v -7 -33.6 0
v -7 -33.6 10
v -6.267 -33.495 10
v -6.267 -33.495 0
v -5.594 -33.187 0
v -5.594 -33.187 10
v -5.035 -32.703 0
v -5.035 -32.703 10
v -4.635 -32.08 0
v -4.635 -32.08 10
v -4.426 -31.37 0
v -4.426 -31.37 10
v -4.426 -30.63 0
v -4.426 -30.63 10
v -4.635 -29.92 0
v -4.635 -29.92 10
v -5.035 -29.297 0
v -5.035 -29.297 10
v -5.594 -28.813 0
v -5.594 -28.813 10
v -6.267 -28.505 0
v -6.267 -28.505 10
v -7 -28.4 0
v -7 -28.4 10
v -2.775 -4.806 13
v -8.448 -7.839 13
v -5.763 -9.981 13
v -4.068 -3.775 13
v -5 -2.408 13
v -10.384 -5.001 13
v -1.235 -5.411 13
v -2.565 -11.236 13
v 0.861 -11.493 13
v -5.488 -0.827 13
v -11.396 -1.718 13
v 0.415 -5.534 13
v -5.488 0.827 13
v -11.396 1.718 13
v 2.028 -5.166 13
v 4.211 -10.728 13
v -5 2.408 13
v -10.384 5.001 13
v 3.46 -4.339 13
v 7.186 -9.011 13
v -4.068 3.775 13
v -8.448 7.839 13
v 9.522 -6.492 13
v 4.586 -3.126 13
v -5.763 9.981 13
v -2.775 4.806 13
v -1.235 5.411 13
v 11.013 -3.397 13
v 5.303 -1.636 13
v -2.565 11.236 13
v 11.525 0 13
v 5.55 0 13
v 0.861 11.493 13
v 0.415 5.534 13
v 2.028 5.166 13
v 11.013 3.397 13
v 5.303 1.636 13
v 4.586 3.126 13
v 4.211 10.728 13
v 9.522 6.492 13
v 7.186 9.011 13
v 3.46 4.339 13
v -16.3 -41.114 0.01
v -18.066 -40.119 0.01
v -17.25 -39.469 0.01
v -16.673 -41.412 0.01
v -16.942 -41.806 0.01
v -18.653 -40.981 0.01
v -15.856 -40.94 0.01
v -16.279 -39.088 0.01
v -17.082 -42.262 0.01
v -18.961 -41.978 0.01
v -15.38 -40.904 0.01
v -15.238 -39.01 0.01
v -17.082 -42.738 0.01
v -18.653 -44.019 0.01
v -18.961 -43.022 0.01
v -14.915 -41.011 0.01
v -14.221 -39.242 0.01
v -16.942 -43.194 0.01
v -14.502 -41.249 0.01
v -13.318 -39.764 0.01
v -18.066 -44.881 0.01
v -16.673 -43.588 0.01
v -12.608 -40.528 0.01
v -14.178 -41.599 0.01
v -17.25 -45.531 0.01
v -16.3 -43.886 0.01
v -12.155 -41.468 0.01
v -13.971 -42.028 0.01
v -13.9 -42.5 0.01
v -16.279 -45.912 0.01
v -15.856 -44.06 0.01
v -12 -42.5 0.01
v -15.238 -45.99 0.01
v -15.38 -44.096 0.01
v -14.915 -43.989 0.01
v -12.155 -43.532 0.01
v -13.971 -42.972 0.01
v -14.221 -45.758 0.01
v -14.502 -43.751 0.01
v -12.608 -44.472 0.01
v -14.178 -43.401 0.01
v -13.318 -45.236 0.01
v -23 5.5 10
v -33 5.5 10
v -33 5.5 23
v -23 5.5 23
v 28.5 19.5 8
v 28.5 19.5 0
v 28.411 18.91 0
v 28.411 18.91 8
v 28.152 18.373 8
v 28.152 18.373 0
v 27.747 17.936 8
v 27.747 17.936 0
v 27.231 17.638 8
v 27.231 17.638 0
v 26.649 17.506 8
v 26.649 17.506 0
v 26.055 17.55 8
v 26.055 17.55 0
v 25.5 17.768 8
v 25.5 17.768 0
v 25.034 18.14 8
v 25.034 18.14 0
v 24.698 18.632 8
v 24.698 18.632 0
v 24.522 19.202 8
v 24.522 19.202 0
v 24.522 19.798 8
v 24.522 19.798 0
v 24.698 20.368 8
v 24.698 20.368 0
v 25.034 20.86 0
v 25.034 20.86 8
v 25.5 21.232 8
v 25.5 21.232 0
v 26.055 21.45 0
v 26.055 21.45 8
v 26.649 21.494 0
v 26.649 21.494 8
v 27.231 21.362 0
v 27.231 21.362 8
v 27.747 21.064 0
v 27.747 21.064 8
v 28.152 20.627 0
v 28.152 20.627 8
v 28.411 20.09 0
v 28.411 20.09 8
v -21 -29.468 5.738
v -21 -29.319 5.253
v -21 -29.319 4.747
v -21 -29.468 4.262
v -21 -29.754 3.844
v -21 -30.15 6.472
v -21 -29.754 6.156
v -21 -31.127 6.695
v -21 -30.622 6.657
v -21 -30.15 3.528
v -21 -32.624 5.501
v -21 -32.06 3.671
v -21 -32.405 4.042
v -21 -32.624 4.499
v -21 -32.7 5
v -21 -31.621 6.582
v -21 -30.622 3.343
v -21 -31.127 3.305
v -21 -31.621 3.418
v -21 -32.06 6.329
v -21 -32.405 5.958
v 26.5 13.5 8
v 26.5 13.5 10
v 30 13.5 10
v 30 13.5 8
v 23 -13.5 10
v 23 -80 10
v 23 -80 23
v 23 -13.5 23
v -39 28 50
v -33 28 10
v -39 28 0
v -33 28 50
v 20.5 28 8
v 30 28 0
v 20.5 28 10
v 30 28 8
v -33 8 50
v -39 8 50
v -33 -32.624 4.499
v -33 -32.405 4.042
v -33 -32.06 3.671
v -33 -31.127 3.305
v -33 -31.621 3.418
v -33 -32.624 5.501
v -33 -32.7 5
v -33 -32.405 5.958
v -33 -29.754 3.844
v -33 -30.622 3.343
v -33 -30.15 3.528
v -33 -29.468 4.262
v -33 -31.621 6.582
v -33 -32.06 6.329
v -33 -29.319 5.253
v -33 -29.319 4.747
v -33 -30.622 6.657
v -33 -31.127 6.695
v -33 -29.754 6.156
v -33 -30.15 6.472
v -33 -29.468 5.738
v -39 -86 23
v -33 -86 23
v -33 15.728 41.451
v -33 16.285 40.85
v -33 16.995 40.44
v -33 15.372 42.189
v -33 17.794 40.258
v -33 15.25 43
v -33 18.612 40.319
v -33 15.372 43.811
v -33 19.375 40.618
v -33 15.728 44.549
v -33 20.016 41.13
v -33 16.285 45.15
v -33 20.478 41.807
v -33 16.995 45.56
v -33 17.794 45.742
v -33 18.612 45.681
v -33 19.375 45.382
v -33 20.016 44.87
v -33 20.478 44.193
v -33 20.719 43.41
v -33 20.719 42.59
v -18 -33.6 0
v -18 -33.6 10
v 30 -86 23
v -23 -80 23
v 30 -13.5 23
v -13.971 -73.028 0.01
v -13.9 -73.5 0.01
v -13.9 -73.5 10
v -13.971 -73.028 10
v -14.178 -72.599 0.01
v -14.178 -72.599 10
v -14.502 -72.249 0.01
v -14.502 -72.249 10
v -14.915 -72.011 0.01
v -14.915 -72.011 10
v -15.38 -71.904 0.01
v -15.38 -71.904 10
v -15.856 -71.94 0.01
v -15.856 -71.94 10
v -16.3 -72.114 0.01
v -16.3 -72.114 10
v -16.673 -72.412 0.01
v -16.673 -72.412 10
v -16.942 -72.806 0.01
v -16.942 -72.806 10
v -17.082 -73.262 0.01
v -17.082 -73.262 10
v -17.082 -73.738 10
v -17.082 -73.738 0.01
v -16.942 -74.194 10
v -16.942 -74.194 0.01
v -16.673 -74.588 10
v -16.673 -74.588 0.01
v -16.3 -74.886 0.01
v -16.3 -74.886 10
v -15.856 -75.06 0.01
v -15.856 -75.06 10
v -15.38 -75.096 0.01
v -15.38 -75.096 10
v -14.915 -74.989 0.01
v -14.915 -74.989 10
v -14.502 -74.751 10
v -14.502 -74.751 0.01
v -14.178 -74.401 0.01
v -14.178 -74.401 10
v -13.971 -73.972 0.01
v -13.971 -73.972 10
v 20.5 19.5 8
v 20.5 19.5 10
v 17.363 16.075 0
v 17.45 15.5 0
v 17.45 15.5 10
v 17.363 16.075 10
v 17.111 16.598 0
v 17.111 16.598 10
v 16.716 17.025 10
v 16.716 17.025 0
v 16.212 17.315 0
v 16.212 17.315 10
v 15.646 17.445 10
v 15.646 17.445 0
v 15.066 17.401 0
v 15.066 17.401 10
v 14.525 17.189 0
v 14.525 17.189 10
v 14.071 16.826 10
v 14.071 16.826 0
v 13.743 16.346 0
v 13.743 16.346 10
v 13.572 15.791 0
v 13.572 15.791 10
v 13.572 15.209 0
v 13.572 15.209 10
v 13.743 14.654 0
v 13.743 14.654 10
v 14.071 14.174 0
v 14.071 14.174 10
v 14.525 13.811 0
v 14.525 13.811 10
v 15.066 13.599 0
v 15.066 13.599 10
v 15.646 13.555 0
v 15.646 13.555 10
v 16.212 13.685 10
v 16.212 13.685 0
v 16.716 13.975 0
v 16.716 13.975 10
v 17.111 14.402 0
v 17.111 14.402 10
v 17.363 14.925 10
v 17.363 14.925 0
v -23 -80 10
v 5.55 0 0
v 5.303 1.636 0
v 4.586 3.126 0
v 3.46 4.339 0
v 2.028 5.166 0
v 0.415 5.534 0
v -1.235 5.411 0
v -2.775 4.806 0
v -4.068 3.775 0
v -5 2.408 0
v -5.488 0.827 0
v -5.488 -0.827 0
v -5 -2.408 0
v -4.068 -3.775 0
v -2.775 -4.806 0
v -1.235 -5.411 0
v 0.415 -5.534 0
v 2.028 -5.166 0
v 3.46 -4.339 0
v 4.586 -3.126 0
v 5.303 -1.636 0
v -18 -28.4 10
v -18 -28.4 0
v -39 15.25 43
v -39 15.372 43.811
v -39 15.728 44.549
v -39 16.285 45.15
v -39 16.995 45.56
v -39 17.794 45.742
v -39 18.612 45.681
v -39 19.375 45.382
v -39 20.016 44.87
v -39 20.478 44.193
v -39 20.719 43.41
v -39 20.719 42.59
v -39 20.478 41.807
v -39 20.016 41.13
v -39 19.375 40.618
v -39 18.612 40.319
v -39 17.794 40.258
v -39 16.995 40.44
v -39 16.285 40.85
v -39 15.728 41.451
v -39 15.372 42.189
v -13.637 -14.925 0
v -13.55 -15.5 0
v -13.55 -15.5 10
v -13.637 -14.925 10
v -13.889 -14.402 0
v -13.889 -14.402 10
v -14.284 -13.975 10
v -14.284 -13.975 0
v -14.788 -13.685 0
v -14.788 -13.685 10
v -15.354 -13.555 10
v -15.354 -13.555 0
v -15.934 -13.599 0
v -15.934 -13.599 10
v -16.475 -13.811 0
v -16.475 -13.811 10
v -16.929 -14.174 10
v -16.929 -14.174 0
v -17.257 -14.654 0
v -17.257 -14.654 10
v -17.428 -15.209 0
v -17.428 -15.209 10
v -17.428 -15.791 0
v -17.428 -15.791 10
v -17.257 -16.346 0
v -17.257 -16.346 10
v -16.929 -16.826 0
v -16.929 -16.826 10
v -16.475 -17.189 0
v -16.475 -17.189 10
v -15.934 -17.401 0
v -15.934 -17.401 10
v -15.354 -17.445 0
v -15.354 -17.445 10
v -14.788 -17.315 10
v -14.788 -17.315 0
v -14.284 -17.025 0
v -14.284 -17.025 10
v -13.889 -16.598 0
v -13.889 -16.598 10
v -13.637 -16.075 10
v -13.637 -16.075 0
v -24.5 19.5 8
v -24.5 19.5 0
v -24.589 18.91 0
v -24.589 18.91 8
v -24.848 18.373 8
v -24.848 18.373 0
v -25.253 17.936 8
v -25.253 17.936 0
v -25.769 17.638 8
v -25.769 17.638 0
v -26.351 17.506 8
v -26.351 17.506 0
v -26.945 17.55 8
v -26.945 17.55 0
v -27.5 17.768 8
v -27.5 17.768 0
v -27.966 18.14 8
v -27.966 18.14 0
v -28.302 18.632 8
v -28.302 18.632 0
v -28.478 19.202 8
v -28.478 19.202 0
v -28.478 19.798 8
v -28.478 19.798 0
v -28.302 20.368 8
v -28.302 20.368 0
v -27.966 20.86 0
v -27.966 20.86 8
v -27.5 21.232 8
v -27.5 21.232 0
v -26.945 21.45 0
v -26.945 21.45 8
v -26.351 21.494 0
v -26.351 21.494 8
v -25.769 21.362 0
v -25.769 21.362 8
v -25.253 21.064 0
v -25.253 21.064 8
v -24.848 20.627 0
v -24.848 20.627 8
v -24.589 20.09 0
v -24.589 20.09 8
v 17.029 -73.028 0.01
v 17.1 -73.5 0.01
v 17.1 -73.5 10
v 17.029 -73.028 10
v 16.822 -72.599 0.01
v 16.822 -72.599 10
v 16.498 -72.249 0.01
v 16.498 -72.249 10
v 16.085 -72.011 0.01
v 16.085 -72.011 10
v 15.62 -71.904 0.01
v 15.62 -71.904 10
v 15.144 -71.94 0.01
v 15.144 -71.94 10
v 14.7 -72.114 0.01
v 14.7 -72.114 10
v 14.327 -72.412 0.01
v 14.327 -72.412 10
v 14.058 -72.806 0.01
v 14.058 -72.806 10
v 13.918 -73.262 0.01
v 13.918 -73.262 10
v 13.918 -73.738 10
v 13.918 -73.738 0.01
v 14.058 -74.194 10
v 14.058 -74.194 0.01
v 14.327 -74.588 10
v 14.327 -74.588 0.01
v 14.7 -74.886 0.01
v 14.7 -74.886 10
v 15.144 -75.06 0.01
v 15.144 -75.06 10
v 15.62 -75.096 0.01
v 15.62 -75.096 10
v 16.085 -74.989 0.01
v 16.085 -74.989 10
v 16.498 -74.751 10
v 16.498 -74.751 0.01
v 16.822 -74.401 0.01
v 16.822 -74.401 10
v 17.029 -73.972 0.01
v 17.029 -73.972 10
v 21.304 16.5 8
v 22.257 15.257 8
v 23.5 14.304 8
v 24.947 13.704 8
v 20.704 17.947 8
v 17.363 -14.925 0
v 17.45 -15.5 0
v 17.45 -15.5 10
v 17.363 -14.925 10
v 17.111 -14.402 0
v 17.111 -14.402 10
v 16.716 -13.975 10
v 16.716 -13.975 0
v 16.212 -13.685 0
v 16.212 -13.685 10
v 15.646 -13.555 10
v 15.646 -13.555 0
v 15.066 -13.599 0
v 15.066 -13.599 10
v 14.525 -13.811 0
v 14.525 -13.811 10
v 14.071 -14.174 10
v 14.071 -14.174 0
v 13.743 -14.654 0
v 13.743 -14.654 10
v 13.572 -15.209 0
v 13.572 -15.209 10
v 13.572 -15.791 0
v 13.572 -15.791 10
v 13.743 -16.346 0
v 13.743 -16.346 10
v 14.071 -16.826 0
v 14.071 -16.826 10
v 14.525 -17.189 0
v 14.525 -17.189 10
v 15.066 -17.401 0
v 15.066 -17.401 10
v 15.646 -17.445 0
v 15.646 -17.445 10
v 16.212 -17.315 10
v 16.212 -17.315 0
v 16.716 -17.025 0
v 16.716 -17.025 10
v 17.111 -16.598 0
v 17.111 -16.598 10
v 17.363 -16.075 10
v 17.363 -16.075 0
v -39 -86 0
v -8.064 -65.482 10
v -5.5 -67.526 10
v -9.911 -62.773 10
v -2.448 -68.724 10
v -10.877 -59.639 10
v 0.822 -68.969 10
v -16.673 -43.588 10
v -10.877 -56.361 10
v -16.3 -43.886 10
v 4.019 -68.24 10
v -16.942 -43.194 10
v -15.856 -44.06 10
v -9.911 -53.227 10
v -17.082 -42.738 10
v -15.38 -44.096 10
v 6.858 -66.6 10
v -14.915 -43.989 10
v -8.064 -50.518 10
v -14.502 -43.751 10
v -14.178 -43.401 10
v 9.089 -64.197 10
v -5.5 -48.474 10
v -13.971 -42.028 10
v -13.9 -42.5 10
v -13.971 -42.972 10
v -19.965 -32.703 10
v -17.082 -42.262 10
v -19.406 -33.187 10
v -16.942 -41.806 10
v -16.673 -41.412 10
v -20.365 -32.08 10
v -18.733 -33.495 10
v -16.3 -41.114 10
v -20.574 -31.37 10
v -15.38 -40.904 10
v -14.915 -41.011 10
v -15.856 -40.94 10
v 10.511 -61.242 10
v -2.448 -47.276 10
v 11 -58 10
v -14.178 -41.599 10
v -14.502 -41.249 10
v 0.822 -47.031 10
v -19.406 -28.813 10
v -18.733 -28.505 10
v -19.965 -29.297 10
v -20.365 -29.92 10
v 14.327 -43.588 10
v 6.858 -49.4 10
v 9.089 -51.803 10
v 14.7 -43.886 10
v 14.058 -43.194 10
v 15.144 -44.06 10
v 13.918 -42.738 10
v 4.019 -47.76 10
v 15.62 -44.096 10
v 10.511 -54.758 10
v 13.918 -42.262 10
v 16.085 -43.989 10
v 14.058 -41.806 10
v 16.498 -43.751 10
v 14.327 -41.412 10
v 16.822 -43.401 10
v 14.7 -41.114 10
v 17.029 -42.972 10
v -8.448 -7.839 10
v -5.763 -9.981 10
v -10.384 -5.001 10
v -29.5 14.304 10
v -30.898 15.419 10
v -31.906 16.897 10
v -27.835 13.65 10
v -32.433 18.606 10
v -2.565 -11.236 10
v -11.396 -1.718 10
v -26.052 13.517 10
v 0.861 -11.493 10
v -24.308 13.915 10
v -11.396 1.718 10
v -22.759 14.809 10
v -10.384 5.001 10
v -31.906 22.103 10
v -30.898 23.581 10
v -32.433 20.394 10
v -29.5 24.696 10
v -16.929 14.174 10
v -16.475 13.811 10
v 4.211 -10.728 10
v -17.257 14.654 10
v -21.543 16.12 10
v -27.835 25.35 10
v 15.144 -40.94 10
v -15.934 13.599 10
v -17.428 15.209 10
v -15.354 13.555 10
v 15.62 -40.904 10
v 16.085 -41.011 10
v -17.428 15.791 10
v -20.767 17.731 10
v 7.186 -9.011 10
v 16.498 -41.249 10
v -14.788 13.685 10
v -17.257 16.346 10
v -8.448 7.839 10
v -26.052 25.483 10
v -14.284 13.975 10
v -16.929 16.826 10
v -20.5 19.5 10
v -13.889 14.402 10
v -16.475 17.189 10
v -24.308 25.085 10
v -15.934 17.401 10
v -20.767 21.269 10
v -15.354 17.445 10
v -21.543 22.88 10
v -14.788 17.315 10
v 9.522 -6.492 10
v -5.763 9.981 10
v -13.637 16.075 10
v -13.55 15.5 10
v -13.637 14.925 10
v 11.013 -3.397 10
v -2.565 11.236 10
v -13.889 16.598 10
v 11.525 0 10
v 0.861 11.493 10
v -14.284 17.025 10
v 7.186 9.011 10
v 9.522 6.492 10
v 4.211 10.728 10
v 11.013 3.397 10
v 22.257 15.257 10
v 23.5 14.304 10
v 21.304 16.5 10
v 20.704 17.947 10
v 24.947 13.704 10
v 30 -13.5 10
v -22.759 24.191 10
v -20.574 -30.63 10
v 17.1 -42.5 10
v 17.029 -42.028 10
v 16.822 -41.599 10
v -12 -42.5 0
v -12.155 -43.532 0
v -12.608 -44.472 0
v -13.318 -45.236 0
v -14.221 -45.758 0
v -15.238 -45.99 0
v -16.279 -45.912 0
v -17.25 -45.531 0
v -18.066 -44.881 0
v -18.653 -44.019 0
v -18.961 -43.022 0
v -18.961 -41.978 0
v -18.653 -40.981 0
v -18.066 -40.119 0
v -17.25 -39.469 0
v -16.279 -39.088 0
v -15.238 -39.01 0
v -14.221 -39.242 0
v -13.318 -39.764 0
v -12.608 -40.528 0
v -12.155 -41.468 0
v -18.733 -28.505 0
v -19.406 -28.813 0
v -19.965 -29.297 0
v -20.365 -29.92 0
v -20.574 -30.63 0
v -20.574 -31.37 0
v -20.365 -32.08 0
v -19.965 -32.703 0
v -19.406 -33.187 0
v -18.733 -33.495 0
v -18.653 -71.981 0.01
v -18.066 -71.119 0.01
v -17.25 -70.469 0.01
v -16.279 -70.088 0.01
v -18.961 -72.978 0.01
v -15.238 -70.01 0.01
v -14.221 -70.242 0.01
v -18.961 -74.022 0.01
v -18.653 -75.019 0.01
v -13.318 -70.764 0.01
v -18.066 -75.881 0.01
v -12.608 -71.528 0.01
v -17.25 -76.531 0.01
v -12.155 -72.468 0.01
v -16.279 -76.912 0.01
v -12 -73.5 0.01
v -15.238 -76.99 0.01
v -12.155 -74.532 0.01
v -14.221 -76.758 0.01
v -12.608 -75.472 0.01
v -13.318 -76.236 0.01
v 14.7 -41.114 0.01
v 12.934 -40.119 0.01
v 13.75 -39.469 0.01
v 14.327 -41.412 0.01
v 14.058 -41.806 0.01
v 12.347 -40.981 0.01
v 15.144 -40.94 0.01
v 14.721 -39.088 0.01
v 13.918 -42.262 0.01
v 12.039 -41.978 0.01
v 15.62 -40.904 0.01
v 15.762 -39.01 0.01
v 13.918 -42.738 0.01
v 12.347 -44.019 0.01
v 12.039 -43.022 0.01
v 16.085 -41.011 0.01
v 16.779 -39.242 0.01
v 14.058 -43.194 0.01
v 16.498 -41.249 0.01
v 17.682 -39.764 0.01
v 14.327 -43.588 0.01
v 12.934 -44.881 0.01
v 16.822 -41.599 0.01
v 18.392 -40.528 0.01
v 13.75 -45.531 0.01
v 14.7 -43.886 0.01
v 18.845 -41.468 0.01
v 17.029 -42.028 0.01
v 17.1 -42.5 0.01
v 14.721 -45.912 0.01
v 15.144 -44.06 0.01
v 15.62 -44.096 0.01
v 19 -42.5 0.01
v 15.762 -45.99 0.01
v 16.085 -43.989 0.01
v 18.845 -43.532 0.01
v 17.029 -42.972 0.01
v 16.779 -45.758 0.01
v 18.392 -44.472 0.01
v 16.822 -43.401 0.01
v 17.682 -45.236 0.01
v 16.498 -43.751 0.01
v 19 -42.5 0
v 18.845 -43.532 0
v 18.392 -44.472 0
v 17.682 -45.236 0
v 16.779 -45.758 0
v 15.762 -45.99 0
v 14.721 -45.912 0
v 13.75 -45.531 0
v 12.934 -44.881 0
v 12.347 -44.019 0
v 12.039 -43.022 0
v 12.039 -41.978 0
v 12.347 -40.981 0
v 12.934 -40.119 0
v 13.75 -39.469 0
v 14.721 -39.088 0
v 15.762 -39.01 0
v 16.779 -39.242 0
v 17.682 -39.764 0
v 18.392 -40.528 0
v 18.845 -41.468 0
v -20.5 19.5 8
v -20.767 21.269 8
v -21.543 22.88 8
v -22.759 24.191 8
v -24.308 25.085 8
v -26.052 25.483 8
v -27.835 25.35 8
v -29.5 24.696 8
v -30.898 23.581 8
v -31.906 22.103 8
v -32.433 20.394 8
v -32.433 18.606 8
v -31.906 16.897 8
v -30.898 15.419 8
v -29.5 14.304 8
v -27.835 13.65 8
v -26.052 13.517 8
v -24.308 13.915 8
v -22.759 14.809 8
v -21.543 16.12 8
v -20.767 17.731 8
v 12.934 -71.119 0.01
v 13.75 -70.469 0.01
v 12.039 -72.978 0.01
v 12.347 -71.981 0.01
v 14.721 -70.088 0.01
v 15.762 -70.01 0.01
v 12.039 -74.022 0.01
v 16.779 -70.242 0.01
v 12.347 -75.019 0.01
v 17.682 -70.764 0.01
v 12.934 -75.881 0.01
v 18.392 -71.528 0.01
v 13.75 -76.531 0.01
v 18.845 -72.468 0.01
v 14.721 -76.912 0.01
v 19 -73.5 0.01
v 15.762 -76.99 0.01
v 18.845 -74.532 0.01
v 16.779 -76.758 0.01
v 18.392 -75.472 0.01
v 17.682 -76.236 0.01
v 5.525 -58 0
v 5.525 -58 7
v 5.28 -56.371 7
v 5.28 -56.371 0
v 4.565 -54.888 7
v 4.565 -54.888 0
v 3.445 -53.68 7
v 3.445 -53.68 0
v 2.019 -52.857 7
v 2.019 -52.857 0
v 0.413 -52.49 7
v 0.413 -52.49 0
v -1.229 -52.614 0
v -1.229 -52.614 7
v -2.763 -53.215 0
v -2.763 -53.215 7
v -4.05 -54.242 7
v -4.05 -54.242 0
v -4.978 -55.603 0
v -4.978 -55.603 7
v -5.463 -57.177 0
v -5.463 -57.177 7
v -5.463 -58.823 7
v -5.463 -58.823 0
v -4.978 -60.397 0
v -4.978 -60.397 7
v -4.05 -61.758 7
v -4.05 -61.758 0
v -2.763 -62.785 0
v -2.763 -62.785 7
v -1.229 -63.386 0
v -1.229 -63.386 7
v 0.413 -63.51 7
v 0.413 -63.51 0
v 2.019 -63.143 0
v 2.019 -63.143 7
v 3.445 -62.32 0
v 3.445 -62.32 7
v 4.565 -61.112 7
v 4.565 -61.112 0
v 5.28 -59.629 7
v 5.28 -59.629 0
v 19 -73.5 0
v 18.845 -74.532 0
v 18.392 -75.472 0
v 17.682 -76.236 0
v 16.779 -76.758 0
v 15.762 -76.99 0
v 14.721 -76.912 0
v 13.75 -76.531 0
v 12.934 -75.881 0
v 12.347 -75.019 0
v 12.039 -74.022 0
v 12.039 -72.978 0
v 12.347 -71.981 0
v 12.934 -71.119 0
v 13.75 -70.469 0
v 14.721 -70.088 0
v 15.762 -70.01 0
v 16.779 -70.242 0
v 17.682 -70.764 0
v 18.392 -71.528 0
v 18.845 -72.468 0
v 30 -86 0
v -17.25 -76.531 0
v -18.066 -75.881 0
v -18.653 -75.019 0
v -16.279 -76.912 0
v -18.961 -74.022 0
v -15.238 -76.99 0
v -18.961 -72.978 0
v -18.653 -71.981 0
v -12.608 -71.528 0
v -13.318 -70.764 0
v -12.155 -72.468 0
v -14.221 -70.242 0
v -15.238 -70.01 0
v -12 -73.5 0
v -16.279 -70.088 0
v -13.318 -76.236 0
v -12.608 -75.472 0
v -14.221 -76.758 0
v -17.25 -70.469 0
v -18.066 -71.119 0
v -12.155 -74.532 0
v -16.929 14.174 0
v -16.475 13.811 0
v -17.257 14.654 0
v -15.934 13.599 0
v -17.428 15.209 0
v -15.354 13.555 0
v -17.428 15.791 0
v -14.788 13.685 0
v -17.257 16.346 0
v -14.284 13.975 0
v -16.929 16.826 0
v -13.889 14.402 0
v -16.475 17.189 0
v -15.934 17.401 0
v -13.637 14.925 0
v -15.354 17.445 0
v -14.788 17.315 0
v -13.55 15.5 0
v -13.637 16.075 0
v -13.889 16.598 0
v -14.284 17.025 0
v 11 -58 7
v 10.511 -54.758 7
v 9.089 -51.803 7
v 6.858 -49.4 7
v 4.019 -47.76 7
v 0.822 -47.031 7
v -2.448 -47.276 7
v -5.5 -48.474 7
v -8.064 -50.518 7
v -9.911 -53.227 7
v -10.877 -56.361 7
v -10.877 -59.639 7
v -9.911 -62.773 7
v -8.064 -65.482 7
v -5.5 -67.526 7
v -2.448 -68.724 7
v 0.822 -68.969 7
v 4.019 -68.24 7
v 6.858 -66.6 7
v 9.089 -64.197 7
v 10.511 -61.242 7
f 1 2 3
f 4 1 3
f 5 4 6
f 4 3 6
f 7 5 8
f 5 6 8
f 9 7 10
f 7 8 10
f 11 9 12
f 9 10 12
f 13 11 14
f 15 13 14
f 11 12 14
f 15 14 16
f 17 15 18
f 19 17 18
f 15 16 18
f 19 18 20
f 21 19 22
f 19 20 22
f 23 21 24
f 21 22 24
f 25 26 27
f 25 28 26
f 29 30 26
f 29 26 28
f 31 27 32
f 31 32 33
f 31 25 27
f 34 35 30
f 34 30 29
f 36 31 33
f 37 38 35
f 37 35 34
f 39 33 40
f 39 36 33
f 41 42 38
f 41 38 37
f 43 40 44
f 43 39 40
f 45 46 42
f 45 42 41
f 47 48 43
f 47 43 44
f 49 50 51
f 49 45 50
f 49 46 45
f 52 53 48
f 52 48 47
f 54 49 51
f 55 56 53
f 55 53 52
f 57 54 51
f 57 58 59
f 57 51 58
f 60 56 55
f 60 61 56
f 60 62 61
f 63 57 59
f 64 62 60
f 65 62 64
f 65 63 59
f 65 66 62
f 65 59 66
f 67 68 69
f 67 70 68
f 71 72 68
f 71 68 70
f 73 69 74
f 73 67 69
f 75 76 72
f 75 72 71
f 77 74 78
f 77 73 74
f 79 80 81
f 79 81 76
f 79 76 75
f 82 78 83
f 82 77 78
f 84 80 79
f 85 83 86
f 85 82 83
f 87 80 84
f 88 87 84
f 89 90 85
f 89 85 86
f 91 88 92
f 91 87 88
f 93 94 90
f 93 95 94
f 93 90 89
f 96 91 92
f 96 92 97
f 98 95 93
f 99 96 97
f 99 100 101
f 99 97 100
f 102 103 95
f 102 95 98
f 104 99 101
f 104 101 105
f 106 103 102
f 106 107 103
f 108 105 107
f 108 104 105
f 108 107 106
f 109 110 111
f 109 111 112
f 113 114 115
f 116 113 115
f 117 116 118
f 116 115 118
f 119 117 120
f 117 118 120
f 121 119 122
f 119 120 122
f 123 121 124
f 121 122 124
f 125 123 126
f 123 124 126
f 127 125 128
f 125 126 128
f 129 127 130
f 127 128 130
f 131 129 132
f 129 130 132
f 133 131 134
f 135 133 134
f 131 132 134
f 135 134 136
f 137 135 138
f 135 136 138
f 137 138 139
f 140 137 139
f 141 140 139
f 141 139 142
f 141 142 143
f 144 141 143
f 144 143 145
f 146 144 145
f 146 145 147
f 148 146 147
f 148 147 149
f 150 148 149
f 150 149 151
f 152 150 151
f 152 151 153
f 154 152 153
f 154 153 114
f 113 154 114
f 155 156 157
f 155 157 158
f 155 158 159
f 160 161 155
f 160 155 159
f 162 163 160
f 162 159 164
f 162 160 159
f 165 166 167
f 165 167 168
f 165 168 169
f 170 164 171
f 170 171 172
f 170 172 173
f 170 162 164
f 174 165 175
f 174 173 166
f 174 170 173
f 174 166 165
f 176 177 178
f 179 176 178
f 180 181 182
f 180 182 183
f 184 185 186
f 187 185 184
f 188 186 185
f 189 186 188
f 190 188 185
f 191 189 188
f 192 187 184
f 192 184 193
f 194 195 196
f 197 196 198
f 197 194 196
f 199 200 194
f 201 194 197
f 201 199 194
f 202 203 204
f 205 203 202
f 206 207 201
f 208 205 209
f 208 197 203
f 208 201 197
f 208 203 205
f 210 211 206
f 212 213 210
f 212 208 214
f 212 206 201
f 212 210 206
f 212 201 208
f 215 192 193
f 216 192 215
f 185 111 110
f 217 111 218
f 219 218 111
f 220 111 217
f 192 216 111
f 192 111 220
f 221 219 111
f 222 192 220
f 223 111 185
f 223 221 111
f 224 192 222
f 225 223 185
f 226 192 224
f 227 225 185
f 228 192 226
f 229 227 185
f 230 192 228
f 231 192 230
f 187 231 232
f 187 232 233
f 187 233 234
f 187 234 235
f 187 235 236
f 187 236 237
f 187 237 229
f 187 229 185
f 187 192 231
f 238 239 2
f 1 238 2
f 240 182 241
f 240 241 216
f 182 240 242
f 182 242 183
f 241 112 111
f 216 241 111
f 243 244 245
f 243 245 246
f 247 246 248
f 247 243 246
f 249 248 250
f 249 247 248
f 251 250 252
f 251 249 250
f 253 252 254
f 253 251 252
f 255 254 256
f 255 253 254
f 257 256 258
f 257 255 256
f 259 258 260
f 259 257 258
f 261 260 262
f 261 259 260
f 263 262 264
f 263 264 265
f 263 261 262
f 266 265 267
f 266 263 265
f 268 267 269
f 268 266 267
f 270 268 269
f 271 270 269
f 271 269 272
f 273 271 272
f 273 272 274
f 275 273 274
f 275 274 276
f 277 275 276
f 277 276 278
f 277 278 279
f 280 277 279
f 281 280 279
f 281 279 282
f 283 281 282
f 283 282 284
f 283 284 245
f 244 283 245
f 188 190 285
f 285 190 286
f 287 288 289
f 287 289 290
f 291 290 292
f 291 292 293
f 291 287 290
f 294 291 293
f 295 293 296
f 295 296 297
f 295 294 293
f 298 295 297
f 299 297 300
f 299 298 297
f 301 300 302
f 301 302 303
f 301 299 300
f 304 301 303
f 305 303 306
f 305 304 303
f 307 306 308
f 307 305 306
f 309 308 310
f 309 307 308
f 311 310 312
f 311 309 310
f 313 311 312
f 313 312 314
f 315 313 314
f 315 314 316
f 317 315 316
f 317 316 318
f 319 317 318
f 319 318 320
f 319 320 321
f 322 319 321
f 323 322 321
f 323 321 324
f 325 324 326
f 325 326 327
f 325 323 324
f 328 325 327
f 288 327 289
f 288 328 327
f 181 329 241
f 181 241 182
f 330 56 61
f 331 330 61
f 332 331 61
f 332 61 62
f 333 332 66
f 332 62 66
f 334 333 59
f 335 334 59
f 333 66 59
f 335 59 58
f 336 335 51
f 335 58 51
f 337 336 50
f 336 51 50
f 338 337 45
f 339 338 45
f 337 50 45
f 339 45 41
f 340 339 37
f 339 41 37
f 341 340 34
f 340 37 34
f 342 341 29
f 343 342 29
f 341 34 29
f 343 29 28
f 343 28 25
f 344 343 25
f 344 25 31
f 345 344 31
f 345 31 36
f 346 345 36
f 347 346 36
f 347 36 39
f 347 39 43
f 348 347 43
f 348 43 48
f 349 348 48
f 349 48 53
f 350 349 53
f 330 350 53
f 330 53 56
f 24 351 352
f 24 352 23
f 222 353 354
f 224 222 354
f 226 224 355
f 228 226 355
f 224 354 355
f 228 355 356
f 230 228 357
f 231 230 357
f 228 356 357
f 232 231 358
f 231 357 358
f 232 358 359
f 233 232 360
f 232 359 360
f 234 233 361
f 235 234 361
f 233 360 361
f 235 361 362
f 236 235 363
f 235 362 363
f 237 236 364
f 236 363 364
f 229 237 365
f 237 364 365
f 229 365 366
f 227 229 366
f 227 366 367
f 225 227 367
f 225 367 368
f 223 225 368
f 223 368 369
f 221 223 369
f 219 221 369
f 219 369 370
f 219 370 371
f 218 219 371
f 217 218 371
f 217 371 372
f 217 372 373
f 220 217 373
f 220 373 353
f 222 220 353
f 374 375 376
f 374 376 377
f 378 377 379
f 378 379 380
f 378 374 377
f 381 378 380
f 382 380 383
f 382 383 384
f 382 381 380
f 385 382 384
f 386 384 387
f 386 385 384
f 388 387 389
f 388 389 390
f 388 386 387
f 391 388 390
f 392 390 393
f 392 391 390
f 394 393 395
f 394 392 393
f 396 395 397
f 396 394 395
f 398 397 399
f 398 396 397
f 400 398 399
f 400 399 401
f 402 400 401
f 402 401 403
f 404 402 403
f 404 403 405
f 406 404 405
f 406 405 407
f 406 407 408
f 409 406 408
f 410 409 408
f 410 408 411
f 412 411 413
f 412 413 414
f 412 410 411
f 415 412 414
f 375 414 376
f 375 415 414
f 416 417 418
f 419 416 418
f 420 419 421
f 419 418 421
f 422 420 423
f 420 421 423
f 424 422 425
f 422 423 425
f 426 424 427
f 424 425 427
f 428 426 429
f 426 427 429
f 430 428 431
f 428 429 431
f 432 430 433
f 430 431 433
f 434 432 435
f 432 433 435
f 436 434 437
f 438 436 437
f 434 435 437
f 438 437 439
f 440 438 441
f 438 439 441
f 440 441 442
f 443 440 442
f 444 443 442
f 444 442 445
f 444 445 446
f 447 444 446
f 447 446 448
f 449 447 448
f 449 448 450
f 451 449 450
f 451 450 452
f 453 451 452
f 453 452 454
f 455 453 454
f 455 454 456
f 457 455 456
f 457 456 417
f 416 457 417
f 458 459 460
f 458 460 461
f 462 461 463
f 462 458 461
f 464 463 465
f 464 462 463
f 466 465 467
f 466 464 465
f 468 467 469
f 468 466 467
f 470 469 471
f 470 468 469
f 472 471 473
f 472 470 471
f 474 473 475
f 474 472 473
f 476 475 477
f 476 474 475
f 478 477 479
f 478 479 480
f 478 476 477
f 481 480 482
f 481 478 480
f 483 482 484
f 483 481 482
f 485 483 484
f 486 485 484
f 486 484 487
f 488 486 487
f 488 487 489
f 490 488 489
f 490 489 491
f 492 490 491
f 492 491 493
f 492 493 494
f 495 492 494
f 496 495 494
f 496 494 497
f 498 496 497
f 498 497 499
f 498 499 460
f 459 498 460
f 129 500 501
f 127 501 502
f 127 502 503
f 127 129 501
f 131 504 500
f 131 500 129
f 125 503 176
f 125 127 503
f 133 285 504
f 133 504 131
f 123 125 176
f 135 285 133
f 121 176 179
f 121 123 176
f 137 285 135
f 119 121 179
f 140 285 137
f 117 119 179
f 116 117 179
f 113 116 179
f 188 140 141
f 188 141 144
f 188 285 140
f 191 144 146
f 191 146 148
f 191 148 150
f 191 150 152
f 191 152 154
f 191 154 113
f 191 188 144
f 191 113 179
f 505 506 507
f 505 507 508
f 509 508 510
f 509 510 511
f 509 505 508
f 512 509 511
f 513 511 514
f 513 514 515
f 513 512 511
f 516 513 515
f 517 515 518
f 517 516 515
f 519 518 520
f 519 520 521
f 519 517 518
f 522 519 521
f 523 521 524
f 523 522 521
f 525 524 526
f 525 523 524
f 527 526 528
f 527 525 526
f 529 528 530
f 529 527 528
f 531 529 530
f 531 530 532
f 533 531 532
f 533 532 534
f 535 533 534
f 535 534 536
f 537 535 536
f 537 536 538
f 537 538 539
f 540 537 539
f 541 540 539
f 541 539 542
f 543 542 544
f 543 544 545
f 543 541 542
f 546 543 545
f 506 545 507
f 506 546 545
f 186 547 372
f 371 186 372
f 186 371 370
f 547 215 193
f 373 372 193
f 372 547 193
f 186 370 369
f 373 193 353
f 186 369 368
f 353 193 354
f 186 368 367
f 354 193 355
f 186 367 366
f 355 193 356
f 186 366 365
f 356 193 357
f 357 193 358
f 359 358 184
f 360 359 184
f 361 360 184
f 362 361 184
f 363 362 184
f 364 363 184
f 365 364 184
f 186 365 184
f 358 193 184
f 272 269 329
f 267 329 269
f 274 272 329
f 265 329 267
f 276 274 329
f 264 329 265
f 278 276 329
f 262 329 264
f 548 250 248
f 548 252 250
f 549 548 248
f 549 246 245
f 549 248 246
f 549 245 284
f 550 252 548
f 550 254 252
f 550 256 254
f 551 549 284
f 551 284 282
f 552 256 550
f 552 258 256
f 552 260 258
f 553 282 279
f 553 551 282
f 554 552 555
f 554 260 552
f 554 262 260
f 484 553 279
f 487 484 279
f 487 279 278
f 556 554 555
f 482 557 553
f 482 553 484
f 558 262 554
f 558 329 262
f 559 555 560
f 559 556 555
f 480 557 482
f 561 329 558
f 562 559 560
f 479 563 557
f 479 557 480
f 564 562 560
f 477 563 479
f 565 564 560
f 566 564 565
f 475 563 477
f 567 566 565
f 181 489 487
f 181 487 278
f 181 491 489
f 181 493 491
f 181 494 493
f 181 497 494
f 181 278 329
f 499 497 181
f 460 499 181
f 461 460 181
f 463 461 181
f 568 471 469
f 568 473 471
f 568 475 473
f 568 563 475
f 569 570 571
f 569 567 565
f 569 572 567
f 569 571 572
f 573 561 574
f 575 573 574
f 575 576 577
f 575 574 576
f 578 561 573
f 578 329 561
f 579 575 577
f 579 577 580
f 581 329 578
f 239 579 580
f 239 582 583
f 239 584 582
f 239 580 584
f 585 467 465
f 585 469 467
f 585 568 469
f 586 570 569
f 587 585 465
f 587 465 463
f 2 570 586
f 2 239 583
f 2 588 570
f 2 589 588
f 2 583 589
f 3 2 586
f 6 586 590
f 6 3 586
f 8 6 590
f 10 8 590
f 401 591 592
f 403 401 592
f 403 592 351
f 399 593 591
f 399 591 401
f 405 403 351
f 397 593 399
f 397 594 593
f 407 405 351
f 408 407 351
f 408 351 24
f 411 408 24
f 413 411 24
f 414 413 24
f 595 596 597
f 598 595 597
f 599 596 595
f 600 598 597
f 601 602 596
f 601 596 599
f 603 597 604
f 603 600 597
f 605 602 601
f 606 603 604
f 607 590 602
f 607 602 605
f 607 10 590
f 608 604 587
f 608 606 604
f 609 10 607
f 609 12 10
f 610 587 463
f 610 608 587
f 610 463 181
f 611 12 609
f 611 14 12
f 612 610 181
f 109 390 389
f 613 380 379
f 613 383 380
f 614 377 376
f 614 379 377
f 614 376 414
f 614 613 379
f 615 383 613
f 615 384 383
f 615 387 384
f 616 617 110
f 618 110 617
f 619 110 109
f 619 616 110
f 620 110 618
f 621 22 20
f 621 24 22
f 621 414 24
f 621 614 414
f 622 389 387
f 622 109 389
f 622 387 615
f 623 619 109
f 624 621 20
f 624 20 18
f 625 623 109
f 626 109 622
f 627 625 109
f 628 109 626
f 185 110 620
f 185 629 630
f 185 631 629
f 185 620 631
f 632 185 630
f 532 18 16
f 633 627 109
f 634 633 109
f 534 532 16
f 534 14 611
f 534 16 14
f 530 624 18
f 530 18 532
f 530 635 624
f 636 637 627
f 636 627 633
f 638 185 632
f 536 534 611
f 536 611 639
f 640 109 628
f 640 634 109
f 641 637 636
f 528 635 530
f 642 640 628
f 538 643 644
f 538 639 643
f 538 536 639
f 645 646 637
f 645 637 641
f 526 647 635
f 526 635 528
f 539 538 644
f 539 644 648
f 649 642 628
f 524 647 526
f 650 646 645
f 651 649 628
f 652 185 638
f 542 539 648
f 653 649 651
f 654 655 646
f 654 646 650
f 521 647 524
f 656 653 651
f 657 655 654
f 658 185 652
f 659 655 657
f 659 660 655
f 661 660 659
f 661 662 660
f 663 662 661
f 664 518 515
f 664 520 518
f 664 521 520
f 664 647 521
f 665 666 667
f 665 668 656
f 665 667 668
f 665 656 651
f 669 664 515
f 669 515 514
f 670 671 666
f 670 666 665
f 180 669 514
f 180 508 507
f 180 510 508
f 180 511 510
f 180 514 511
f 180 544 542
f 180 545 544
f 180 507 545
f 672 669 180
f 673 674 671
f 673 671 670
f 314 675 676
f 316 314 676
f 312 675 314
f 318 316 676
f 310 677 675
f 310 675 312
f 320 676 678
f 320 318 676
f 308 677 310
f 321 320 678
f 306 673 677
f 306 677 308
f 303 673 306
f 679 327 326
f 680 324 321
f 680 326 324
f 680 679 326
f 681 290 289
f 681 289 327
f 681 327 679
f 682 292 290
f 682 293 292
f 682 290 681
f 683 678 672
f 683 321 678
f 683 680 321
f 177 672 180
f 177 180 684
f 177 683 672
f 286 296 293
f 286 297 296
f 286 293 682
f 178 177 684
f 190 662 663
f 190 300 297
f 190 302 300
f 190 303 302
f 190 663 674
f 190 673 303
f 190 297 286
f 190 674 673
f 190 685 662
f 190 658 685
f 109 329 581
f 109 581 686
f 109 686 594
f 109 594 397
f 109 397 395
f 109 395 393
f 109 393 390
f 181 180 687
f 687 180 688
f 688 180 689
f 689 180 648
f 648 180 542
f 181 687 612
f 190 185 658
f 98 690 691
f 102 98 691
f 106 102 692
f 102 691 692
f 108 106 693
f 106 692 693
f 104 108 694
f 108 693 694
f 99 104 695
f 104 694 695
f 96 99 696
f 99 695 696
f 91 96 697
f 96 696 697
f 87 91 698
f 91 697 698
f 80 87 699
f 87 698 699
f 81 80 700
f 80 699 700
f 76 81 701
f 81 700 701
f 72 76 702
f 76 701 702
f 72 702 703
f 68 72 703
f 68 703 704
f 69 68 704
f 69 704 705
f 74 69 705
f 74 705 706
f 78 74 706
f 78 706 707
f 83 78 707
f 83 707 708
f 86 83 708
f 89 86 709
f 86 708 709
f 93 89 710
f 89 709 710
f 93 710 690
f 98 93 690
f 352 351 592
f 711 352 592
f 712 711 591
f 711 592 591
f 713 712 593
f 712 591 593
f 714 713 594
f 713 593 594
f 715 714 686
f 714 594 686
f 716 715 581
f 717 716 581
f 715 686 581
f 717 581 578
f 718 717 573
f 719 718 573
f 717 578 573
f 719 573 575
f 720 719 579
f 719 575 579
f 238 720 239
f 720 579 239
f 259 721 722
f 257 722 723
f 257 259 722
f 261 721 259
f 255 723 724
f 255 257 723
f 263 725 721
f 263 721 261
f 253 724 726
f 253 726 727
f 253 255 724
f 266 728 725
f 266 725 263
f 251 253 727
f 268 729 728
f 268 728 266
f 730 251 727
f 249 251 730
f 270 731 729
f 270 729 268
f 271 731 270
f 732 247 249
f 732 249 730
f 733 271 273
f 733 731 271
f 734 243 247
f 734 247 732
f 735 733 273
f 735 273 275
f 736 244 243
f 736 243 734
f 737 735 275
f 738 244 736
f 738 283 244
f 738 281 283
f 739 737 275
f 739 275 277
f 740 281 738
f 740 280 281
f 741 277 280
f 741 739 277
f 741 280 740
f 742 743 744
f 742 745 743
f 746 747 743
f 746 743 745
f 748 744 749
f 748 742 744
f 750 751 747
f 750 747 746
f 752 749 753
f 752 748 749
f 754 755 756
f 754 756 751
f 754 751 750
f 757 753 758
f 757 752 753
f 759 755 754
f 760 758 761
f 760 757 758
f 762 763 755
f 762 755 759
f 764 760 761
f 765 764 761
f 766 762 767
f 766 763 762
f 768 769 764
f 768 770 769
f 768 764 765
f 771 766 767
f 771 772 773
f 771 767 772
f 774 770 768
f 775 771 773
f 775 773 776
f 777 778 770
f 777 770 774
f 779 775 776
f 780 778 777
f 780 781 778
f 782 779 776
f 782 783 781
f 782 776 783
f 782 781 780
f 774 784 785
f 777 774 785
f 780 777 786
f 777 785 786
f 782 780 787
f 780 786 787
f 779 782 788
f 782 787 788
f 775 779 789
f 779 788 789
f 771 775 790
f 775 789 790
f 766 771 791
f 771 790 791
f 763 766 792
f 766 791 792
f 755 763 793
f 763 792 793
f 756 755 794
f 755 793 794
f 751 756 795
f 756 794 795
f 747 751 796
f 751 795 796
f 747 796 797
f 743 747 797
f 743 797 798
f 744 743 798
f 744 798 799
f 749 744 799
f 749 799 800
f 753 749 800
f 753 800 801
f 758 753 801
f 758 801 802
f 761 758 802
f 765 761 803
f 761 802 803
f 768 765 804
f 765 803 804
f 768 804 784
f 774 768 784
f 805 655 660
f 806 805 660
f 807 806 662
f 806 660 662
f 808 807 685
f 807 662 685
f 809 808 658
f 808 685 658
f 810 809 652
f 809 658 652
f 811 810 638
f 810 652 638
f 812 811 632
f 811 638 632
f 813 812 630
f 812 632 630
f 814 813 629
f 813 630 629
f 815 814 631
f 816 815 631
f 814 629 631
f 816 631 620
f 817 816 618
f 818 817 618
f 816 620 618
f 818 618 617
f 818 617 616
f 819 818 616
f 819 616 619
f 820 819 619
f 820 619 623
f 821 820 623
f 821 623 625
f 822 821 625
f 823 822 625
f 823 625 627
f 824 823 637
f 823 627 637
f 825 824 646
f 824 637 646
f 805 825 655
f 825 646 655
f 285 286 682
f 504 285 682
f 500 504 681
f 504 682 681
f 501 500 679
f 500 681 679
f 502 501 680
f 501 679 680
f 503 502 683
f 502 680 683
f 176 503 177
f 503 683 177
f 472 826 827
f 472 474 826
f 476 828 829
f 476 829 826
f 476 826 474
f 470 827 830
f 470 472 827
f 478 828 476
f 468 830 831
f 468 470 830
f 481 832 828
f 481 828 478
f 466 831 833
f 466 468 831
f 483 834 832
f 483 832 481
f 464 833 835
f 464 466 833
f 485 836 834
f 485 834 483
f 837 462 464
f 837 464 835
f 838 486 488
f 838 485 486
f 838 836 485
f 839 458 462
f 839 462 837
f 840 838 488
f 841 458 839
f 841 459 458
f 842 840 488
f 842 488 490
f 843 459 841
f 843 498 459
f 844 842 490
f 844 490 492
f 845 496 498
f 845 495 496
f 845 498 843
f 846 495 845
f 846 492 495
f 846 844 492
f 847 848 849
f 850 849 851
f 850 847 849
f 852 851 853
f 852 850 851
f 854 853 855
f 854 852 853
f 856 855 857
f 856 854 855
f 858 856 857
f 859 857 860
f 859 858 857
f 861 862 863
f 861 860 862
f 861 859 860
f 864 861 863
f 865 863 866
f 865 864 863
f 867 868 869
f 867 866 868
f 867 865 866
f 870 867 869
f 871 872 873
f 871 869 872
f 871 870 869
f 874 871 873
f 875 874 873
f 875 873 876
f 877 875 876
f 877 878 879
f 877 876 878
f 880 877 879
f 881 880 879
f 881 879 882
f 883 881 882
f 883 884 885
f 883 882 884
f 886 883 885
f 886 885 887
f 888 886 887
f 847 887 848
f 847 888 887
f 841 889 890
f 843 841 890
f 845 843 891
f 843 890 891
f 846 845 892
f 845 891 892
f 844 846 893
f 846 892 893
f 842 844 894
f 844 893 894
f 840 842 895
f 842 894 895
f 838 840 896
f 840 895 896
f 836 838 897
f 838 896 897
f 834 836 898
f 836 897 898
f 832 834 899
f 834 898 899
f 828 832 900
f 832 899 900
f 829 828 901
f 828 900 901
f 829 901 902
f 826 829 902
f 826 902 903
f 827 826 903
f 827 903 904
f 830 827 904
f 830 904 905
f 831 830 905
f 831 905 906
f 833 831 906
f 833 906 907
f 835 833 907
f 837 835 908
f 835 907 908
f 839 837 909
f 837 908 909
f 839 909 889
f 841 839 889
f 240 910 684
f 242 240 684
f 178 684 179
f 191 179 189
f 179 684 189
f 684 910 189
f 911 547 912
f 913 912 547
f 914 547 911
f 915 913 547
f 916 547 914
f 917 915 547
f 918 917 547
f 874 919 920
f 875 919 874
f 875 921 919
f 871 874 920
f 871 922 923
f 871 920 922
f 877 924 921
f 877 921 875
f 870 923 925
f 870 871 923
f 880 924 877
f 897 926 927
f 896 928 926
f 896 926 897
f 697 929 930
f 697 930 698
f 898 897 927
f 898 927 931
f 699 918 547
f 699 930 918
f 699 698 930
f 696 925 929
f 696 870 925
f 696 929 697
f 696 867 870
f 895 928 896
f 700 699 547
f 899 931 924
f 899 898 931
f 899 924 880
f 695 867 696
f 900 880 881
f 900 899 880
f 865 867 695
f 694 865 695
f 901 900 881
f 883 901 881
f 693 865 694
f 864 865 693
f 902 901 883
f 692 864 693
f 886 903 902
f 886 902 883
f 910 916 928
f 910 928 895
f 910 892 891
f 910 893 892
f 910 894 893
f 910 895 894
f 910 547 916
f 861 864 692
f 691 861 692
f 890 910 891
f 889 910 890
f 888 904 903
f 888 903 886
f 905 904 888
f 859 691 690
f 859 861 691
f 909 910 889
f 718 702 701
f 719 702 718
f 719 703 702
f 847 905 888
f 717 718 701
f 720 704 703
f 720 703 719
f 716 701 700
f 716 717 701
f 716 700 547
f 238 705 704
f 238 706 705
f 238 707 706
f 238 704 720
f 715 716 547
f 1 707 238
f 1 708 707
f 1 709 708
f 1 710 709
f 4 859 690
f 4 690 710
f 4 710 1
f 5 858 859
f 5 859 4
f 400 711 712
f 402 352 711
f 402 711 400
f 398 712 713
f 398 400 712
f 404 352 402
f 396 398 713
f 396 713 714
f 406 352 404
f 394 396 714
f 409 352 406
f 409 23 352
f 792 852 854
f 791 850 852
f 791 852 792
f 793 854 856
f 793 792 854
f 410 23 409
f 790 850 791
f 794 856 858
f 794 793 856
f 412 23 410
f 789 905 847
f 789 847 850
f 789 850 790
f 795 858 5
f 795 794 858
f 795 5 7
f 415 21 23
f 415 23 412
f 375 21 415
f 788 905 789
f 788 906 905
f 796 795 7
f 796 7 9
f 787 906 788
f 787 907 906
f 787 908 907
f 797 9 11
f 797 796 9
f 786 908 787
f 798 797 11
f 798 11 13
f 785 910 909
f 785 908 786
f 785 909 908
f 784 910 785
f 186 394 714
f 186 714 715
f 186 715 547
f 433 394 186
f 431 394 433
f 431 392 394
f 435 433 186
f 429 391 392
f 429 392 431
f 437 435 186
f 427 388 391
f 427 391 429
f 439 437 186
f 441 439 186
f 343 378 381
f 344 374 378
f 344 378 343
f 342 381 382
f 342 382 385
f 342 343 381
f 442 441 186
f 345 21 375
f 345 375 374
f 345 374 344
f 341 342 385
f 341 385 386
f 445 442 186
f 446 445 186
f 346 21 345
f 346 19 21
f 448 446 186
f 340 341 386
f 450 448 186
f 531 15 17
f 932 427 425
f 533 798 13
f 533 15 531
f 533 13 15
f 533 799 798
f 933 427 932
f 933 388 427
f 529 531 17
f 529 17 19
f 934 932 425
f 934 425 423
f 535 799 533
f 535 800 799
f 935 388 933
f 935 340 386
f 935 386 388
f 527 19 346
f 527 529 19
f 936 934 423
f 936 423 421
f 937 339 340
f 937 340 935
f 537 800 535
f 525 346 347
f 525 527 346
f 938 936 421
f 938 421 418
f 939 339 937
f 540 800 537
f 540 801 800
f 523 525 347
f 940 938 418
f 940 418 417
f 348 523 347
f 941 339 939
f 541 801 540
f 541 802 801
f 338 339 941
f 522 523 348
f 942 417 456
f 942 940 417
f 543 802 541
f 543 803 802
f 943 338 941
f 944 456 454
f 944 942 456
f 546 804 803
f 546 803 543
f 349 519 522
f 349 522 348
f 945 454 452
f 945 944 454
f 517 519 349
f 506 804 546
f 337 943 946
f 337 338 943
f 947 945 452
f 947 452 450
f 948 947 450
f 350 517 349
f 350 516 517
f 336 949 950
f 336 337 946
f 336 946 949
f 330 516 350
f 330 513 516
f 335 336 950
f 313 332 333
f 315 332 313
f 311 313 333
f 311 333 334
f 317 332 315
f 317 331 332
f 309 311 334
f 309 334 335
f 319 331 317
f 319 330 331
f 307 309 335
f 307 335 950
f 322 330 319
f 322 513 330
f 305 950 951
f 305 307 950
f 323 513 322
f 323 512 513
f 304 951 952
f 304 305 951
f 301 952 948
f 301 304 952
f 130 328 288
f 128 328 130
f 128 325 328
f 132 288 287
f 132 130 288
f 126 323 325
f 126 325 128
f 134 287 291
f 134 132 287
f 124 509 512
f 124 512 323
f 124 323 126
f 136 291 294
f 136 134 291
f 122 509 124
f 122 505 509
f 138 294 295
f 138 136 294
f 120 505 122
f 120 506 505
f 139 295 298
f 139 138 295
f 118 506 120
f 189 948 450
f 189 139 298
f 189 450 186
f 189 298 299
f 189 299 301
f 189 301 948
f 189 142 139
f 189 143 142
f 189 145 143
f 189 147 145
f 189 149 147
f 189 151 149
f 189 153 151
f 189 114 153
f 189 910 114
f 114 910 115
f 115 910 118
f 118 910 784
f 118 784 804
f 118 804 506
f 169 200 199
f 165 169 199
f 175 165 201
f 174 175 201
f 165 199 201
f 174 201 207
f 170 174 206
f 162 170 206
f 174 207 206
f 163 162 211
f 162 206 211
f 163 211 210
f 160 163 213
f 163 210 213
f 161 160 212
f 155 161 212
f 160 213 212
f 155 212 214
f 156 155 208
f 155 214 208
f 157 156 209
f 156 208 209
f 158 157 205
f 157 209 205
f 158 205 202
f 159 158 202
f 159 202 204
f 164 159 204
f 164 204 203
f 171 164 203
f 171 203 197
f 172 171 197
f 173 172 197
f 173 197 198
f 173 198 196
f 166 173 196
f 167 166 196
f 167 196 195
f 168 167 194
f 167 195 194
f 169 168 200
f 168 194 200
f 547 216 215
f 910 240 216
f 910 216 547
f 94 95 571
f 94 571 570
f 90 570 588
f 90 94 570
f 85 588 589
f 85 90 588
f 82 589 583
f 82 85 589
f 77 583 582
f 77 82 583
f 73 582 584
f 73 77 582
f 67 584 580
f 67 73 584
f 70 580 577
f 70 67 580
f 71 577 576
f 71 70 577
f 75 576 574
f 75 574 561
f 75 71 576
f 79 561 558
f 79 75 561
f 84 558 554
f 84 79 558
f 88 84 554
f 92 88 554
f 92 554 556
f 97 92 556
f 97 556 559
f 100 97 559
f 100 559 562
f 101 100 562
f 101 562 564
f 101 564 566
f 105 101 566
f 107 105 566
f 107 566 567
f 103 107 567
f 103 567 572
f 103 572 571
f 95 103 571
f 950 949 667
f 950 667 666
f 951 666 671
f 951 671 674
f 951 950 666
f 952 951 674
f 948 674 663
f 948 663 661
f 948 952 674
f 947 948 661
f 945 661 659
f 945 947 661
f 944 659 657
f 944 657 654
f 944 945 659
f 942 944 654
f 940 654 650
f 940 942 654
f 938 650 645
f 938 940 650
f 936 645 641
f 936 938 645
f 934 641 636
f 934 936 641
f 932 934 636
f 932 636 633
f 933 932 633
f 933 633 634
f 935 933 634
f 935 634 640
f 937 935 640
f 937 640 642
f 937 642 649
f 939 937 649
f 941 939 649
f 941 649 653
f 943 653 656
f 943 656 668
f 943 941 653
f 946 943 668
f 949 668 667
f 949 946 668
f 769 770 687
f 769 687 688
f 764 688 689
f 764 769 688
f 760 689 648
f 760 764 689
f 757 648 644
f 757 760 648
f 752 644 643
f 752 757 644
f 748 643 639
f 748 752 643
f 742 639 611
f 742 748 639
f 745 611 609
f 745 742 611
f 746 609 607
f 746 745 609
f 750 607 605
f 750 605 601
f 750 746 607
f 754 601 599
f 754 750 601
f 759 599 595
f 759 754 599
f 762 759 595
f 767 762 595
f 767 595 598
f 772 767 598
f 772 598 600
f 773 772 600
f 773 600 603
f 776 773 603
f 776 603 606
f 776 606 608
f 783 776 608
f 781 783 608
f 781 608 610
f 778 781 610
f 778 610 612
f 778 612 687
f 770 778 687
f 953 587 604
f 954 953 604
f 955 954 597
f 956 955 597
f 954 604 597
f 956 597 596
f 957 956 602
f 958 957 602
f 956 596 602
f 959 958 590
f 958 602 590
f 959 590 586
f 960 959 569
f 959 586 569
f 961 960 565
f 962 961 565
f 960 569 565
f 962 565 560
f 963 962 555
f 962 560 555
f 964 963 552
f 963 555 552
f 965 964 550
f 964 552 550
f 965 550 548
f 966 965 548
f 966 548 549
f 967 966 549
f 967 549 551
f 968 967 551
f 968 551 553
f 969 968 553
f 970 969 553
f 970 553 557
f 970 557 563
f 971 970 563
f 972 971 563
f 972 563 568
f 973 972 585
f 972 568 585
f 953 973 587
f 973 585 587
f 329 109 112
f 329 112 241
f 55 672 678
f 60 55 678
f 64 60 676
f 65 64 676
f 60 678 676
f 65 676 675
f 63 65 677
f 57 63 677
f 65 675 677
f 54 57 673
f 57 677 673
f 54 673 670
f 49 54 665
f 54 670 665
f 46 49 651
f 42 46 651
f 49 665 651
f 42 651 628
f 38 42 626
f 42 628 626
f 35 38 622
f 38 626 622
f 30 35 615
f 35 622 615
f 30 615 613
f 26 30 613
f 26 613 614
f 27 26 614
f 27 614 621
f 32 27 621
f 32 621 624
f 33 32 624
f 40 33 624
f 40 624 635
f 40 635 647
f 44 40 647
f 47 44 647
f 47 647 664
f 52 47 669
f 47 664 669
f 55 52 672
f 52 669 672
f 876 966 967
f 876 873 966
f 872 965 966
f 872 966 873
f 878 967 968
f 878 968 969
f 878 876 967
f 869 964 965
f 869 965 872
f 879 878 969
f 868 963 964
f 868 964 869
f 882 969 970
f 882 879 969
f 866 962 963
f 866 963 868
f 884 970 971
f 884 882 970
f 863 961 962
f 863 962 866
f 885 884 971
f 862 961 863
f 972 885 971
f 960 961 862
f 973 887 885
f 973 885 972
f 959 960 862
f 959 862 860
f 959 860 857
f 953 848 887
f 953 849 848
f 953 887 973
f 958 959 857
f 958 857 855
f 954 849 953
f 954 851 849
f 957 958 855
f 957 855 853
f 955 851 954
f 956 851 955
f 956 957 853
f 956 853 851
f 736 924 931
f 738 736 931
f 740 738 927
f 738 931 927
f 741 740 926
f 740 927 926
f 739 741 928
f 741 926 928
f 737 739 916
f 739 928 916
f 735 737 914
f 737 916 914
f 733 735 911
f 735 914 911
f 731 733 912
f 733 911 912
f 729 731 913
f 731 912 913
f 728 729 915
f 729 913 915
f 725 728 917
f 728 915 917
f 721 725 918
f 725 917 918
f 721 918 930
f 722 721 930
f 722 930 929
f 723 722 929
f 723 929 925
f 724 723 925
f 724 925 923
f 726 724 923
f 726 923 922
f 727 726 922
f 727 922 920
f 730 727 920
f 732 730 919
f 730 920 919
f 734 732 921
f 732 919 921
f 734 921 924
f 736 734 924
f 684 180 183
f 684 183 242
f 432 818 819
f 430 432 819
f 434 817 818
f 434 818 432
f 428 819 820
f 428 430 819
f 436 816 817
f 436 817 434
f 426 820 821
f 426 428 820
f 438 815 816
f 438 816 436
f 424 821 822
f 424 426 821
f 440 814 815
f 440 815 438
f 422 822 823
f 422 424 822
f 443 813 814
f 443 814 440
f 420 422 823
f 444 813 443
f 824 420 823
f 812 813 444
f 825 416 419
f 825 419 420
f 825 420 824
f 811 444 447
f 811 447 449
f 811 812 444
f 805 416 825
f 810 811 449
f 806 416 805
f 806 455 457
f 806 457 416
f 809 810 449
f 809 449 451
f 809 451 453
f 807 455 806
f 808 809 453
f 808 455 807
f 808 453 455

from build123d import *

# Parameters (mm, degrees)
SKETCH_W        = 63
SKETCH_H        = 114
SKETCH_R        = 1.95
SKETCH_R_2      = 5.525
SKETCH_R_3      = 1.6
PAD_DEPTH       = 10
SKETCH004_R     = 11.525
PAD001_DEPTH    = 3
SKETCH003_R     = 5.55
POCKET_DEPTH    = 13.001
SKETCH006_R     = 11
POCKET001_DEPTH = 3
SKETCH007_R     = 3.5
POCKET002_DEPTH = 0.01
POCKET003_DEPTH = 10.001
SKETCH009_R     = 1.7
POCKET004_DEPTH = 12
PAD002_DEPTH    = 13
PAD003_DEPTH    = 6
SKETCH023_R     = 2.75
POCKET005_DEPTH = 9
SKETCH025_R     = 2
POCKET006_DEPTH = 16
SKETCH026_R     = 6
POCKET007_DEPTH = 2


with BuildPart() as part:
    # Sketch → Pad (new body)
    with BuildSketch(Plane.XY):
        with Locations((-1.5, -29)):
            Rectangle(SKETCH_W, SKETCH_H)
        with Locations((-15.5, 15.5)):
            Circle(SKETCH_R, mode=Mode.SUBTRACT)
        with Locations((15.5, 15.5)):
            Circle(SKETCH_R, mode=Mode.SUBTRACT)
        with Locations((-15.5, -15.5)):
            Circle(SKETCH_R, mode=Mode.SUBTRACT)
        with Locations((15.5, -15.5)):
            Circle(SKETCH_R, mode=Mode.SUBTRACT)
        with Locations((0, -58)):
            Circle(SKETCH_R_2, mode=Mode.SUBTRACT)
        with Locations((-15.5, -42.5)):
            Circle(SKETCH_R_3, mode=Mode.SUBTRACT)
        with Locations((15.5, -42.5)):
            Circle(SKETCH_R_3, mode=Mode.SUBTRACT)
        with Locations((-15.5, -73.5)):
            Circle(SKETCH_R_3, mode=Mode.SUBTRACT)
        with Locations((15.5, -73.5)):
            Circle(SKETCH_R_3, mode=Mode.SUBTRACT)
    extrude(amount=PAD_DEPTH)

    # Sketch004 (on Face15 of Pad) → Pad001 (join)
    with BuildSketch(Plane.XY.offset(10)):
        Circle(SKETCH004_R)
    extrude(amount=PAD001_DEPTH)

    # Sketch003 (on Face17 of Pad001) → Pocket (cut, through all)
    with BuildSketch(Plane.XY.offset(13)):
        Circle(SKETCH003_R)
    extrude(amount=-POCKET_DEPTH, mode=Mode.SUBTRACT)

    # Sketch006 (on Face5 of Pocket) → Pocket001 (cut)
    with BuildSketch(Plane.XY.offset(10)):
        with Locations((0, -58)):
            Circle(SKETCH006_R)
    extrude(amount=-POCKET001_DEPTH, mode=Mode.SUBTRACT)

    # Sketch007 (on Face4 of Pocket001) → Pocket002 (cut)
    with BuildSketch(Plane(origin=(0, 0, 0), x_dir=(1, 0, 0), z_dir=(0, 0, -1))):
        with Locations((-15.5, 73.5)):
            Circle(SKETCH007_R)
        with Locations((15.5, 73.5)):
            Circle(SKETCH007_R)
        with Locations((15.5, 42.5)):
            Circle(SKETCH007_R)
        with Locations((-15.5, 42.5)):
            Circle(SKETCH007_R)
    extrude(amount=-POCKET002_DEPTH, mode=Mode.SUBTRACT)

    # Sketch008 (on Face5 of Pocket002) → Pocket003 (cut, through all)
    with BuildSketch(Plane.XY.offset(10)):
        with BuildLine():
            ThreePointArc((-18, -28.4), (-20.6, -31), (-18, -33.6))
            Line((-18, -33.6), (-7, -33.6))
            ThreePointArc((-7, -33.6), (-4.4, -31), (-7, -28.4))
            Line((-18, -28.4), (-7, -28.4))
        make_face()
    extrude(amount=-POCKET003_DEPTH, mode=Mode.SUBTRACT)

    # Sketch009 (on Face2 of Pocket003) → Pocket004 (cut)
    with BuildSketch(Plane(origin=(-33, 0, 0), x_dir=(0, -1, 0), z_dir=(-1, 0, 0))):
        with Locations((31, 5)):
            Circle(SKETCH009_R)
    extrude(amount=-POCKET004_DEPTH, mode=Mode.SUBTRACT)

    # Sketch014 (on Face5 of Pocket004) → Pad002 (join)
    with BuildSketch(Plane.XY.offset(10)):
        Polygon((-33, 5.5), (-23, 5.5), (-23, -80), (23, -80), (23, -13.5), (30, -13.5), (30, -86), (-33, -86), align=None)
    extrude(amount=PAD002_DEPTH)

    # Sketch022 (on Face2 of Pad002) → Pad003 (join)
    with BuildSketch(Plane(origin=(-33, 0, 0), x_dir=(0, -1, 0), z_dir=(-1, 0, 0))):
        Polygon((-28, 0), (-28, 50), (-8, 50), (86, 23), (86, 0), align=None)
    extrude(amount=PAD003_DEPTH)

    # Sketch023 (on Face9 of Pad003) → Pocket005 (cut)
    with BuildSketch(Plane(origin=(-39, 0, 0), x_dir=(0, -1, 0), z_dir=(-1, 0, 0))):
        with Locations((-18, 43)):
            Circle(SKETCH023_R)
    extrude(amount=-POCKET005_DEPTH, mode=Mode.SUBTRACT)

    # Sketch025 (on Face4 of Pocket005) → Pocket006 (cut)
    with BuildSketch(Plane(origin=(0, 0, 0), x_dir=(1, 0, 0), z_dir=(0, 0, -1))):
        with Locations((26.5, -19.5)):
            Circle(SKETCH025_R)
        with Locations((-26.5, -19.5)):
            Circle(SKETCH025_R)
    extrude(amount=-POCKET006_DEPTH, mode=Mode.SUBTRACT)

    # Sketch026 (on Face5 of Pocket006) → Pocket007 (cut)
    with BuildSketch(Plane.XY.offset(10)):
        with Locations((-26.5, 19.5)):
            Circle(SKETCH026_R)
        with BuildLine():
            ThreePointArc((20.5, 19.5), (22.257359, 15.257359), (26.5, 13.5))
            Line((26.5, 13.5), (46.5, 13.5))
            Line((20.5, 46.38), (46.5, 13.5))
            Line((20.5, 46.38), (20.5, 19.5))
        make_face()
    extrude(amount=-POCKET007_DEPTH, mode=Mode.SUBTRACT)


solid = part.part
